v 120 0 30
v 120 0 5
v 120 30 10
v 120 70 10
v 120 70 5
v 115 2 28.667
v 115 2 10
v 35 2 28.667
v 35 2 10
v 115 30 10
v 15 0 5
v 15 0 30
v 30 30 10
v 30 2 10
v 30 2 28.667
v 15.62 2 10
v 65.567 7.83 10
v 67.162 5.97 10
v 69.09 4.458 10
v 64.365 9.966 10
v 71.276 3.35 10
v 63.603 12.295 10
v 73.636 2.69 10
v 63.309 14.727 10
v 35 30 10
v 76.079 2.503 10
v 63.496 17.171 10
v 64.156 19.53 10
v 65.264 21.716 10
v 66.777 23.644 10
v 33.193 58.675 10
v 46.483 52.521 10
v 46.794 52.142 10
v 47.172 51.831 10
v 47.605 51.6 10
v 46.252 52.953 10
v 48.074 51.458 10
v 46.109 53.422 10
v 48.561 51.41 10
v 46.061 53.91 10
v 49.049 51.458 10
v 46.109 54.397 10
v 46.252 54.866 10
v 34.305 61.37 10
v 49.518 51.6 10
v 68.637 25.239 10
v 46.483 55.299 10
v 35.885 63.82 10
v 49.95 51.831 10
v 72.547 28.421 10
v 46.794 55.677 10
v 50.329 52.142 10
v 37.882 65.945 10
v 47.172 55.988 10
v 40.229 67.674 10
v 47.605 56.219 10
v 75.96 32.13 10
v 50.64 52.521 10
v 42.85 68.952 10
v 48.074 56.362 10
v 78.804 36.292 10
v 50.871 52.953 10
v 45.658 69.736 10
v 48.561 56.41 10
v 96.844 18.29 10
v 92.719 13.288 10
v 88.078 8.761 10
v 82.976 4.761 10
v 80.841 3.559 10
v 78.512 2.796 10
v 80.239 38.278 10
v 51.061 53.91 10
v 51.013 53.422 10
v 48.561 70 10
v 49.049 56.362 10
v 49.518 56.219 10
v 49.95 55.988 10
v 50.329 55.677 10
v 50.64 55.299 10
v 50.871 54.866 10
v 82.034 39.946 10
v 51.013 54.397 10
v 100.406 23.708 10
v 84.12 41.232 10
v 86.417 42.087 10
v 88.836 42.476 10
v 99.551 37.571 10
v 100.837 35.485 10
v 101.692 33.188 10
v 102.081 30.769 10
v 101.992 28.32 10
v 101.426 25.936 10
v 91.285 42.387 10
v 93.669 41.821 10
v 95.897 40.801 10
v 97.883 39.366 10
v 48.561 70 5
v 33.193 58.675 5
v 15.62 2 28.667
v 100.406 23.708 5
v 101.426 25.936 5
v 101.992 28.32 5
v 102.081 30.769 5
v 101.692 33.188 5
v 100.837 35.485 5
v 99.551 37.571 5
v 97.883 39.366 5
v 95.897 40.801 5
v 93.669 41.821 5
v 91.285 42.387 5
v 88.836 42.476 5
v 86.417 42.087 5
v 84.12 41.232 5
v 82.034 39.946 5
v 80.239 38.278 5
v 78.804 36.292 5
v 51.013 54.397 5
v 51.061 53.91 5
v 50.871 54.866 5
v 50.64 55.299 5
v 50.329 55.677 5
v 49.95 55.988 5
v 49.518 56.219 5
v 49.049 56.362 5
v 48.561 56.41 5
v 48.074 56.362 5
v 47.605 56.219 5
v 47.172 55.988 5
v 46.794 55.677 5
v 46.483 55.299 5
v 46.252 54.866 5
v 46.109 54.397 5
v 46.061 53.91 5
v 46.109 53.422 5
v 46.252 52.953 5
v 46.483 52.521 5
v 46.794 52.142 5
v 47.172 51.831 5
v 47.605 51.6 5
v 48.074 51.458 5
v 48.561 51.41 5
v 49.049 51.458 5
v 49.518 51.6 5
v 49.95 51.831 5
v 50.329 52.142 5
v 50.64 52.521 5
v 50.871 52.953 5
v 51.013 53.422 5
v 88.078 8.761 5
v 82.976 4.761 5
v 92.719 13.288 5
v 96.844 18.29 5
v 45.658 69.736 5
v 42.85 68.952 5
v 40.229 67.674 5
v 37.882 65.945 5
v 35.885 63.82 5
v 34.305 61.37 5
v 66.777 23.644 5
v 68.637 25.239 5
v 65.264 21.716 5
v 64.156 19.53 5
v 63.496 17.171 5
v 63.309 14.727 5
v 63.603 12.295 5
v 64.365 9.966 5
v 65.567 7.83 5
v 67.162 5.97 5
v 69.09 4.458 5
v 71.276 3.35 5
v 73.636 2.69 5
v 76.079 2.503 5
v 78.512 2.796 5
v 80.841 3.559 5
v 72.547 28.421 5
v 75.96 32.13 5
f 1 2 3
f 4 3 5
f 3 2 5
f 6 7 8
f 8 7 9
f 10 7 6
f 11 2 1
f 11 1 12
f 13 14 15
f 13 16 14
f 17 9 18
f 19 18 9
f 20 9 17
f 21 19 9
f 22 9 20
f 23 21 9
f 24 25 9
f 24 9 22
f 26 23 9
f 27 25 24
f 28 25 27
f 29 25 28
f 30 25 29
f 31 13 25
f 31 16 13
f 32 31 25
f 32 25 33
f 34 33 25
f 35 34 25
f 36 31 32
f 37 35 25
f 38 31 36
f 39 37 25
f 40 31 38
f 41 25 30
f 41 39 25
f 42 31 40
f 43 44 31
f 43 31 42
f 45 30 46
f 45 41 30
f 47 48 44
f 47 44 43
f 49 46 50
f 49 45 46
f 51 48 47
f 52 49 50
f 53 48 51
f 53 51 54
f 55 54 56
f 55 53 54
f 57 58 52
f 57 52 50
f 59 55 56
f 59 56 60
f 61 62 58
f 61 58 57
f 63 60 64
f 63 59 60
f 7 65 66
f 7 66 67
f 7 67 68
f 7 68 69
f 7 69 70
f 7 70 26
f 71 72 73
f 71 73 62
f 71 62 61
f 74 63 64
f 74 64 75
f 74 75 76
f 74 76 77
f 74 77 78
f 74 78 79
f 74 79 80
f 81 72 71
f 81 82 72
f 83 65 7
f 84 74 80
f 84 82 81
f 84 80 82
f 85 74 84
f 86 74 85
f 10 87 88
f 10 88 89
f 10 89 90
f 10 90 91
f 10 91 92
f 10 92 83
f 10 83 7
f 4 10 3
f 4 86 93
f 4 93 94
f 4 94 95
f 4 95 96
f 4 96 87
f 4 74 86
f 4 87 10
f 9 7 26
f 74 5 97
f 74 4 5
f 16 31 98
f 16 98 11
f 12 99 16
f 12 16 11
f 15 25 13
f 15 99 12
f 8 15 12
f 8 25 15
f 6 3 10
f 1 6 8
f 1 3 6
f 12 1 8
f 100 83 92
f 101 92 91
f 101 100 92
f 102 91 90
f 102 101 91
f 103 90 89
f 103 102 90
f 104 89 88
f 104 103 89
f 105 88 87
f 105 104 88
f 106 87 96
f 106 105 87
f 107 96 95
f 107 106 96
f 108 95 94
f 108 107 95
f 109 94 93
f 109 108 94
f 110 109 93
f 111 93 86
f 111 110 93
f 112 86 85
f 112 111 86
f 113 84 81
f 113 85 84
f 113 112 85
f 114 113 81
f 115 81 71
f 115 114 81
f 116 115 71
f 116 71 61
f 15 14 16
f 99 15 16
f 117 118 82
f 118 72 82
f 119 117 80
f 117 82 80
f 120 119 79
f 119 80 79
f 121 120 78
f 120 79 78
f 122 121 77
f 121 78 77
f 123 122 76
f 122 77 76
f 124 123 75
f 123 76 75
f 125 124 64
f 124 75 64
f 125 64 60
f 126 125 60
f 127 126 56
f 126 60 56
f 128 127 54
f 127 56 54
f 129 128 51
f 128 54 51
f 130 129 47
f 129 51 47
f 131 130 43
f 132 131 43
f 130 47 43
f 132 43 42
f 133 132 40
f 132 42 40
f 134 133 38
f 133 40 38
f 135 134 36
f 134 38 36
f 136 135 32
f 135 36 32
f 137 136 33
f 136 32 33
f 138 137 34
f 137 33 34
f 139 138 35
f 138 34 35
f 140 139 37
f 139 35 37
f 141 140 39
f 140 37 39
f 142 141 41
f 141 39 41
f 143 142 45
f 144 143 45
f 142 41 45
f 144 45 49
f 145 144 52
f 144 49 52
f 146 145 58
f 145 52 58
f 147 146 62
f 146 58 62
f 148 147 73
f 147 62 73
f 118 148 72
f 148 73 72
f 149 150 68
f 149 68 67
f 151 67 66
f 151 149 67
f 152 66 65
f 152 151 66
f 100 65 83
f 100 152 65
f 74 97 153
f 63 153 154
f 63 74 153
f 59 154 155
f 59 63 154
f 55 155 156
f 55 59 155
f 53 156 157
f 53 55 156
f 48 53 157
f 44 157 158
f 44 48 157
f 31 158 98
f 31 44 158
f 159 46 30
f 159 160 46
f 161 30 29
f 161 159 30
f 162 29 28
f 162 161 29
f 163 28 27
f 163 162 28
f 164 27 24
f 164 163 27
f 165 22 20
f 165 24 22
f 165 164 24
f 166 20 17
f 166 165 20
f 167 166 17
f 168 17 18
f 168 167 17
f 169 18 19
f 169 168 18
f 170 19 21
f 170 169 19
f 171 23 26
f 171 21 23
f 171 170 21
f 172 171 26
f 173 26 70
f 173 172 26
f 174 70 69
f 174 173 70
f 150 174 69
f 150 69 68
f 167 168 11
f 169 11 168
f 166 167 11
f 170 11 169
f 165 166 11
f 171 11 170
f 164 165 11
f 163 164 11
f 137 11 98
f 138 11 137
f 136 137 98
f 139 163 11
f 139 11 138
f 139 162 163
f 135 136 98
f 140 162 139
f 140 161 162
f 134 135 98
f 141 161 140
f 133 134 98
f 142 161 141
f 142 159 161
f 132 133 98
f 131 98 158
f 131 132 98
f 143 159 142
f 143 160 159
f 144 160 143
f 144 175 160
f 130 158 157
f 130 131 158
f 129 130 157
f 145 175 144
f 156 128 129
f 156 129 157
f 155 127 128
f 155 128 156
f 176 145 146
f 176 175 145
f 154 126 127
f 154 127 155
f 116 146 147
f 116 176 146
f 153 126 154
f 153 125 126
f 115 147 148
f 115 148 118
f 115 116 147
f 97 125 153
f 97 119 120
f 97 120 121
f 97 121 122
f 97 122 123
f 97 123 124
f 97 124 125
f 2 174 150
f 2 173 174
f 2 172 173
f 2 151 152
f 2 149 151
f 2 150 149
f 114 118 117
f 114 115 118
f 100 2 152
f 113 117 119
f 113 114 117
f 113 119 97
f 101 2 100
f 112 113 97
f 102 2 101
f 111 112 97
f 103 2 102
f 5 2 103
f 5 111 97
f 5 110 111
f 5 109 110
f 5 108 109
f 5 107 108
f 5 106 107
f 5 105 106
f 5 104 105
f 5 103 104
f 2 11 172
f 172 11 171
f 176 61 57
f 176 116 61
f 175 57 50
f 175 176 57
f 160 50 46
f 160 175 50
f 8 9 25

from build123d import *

# Parameters (mm, degrees)
SKETCH1_W           = 120
SKETCH1_H           = 100
BOSS_EXTRUDE1_DEPTH = 5
SKETCH2_R           = 2.5
CUT_EXTRUDE1_DEPTH  = 6
SKETCH3_W           = 120
SKETCH3_H           = 2
BOSS_EXTRUDE2_DEPTH = 20
CUT_EXTRUDE2_DEPTH  = 26
CUT_EXTRUDE3_DEPTH  = 26
SKETCH6_W           = 5
SKETCH6_H           = 30
BOSS_EXTRUDE3_DEPTH = 20
CUT_EXTRUDE4_DEPTH  = 106
SKETCH10_W          = 27.884556649
SKETCH10_H          = 70
CUT_EXTRUDE5_DEPTH  = 106


with BuildPart() as part:
    # Sketch1 → Boss-Extrude1 (new body)
    with BuildSketch(Plane.XY):
        with Locations((60, 50)):
            Rectangle(SKETCH1_W, SKETCH1_H)
    boss_extrude1 = extrude(amount=BOSS_EXTRUDE1_DEPTH)

    # Sketch2 → Cut-Extrude1 (cut, through all)
    with BuildSketch(Plane.XY.offset(5)):
        with Locations((48.561388608, 53.909722104)):
            Circle(SKETCH2_R)
        with BuildLine():
            ThreePointArc((82.975974789, 4.760599446), (92.719162031, 13.288409394), (100.405906554, 23.707967867))
            ThreePointArc((100.405906554, 23.707967867), (95.896997447, 40.800941239), (78.804024076, 36.292032133))
            ThreePointArc((78.804024076, 36.292032133), (74.320089771, 30.213956356), (68.63656388, 25.239400554))
            ThreePointArc((68.63656388, 25.239400554), (65.566868781, 7.830294546), (82.975974789, 4.760599446))
        make_face()
    cut_extrude1 = extrude(amount=-CUT_EXTRUDE1_DEPTH, mode=Mode.SUBTRACT)

    # Sketch3 → Boss-Extrude2 (add)
    with BuildSketch(Plane(origin=(0, 0, 0), x_dir=(-1, 0, 0), z_dir=(0, 0, -1))):
        with Locations((-60, 1)):
            Rectangle(SKETCH3_W, SKETCH3_H)
    boss_extrude2 = extrude(amount=BOSS_EXTRUDE2_DEPTH)

    # Sketch4 → Cut-Extrude2 (cut, through all)
    with BuildSketch(Plane.XY.offset(5)):
        with BuildLine():
            ThreePointArc((66.494283868, 35.596794606), (72.644903394, 39.60143936), (75.487572744, 46.368013909))
            ThreePointArc((75.487572744, 46.368013909), (73.248961533, 49.104548186), (70.512427256, 46.865936976))
            ThreePointArc((70.512427256, 46.865936976), (68.806825647, 42.805992246), (65.116453931, 40.403205394))
            ThreePointArc((65.116453931, 40.403205394), (63.402163505, 37.311085032), (66.494283868, 35.596794606))
        make_face()
    extrude(amount=-CUT_EXTRUDE2_DEPTH, mode=Mode.SUBTRACT)

    # Sketch5 → Cut-Extrude3 (cut, through all)
    with BuildSketch(Plane.XY.offset(5)):
        with BuildLine():
            Line((120, 70), (48.561388608, 70))
            ThreePointArc((48.561388608, 70), (39.016134462, 66.862913451), (33.192915272, 58.674915711))
            Line((33.192915272, 58.674915711), (15, 0))
            Line((15, 0), (0, 0))
            Line((0, 0), (0, 100))
            Line((0, 100), (120, 100))
            Line((120, 100), (120, 70))
        make_face()
    cut_extrude3 = extrude(amount=-CUT_EXTRUDE3_DEPTH, mode=Mode.SUBTRACT)

    # Sketch6 → Boss-Extrude3 (add, through all)
    with BuildSketch(Plane(origin=(0, 0, 0), x_dir=(-1, 0, 0), z_dir=(0, 0, -1))):
        with Locations((-117.5, 15)):
            Rectangle(SKETCH6_W, SKETCH6_H)
        with Locations((-32.5, 15)):
            Rectangle(SKETCH6_W, SKETCH6_H)
    boss_extrude3 = extrude(amount=BOSS_EXTRUDE3_DEPTH)

    # Sketch9 → Cut-Extrude4 (cut, through all)
    with BuildSketch(Plane(origin=(120, 0, 0), x_dir=(0, 0, -1), z_dir=(1, 0, 0))):
        Polygon((0, 30), (20, 0), (20, 30), align=None)
    cut_extrude4 = extrude(amount=-CUT_EXTRUDE4_DEPTH, mode=Mode.SUBTRACT)

    # Mirror1: Boss-Extrude1, Cut-Extrude1, Boss-Extrude2, Cut-Extrude3, Boss-Extrude3, Cut-Extrude4 across plane
    add(boss_extrude1.mirror(Plane(origin=(0, 0, 5), x_dir=(1, 0, 0), z_dir=(0, 0, -1))))
    add(cut_extrude1.mirror(Plane(origin=(0, 0, 5), x_dir=(1, 0, 0), z_dir=(0, 0, -1))), mode=Mode.SUBTRACT)
    add(boss_extrude2.mirror(Plane(origin=(0, 0, 5), x_dir=(1, 0, 0), z_dir=(0, 0, -1))))
    add(cut_extrude3.mirror(Plane(origin=(0, 0, 5), x_dir=(1, 0, 0), z_dir=(0, 0, -1))), mode=Mode.SUBTRACT)
    add(boss_extrude3.mirror(Plane(origin=(0, 0, 5), x_dir=(1, 0, 0), z_dir=(0, 0, -1))))
    add(cut_extrude4.mirror(Plane(origin=(0, 0, 5), x_dir=(1, 0, 0), z_dir=(0, 0, -1))), mode=Mode.SUBTRACT)

    # Sketch10 → Cut-Extrude5 (cut, through all)
    with BuildSketch(Plane(origin=(120, 0, 0), x_dir=(0, 0, -1), z_dir=(1, 0, 0))):
        with Locations((8.942278325, 35)):
            Rectangle(SKETCH10_W, SKETCH10_H)
    extrude(amount=-CUT_EXTRUDE5_DEPTH, mode=Mode.SUBTRACT)


solid = part.part
